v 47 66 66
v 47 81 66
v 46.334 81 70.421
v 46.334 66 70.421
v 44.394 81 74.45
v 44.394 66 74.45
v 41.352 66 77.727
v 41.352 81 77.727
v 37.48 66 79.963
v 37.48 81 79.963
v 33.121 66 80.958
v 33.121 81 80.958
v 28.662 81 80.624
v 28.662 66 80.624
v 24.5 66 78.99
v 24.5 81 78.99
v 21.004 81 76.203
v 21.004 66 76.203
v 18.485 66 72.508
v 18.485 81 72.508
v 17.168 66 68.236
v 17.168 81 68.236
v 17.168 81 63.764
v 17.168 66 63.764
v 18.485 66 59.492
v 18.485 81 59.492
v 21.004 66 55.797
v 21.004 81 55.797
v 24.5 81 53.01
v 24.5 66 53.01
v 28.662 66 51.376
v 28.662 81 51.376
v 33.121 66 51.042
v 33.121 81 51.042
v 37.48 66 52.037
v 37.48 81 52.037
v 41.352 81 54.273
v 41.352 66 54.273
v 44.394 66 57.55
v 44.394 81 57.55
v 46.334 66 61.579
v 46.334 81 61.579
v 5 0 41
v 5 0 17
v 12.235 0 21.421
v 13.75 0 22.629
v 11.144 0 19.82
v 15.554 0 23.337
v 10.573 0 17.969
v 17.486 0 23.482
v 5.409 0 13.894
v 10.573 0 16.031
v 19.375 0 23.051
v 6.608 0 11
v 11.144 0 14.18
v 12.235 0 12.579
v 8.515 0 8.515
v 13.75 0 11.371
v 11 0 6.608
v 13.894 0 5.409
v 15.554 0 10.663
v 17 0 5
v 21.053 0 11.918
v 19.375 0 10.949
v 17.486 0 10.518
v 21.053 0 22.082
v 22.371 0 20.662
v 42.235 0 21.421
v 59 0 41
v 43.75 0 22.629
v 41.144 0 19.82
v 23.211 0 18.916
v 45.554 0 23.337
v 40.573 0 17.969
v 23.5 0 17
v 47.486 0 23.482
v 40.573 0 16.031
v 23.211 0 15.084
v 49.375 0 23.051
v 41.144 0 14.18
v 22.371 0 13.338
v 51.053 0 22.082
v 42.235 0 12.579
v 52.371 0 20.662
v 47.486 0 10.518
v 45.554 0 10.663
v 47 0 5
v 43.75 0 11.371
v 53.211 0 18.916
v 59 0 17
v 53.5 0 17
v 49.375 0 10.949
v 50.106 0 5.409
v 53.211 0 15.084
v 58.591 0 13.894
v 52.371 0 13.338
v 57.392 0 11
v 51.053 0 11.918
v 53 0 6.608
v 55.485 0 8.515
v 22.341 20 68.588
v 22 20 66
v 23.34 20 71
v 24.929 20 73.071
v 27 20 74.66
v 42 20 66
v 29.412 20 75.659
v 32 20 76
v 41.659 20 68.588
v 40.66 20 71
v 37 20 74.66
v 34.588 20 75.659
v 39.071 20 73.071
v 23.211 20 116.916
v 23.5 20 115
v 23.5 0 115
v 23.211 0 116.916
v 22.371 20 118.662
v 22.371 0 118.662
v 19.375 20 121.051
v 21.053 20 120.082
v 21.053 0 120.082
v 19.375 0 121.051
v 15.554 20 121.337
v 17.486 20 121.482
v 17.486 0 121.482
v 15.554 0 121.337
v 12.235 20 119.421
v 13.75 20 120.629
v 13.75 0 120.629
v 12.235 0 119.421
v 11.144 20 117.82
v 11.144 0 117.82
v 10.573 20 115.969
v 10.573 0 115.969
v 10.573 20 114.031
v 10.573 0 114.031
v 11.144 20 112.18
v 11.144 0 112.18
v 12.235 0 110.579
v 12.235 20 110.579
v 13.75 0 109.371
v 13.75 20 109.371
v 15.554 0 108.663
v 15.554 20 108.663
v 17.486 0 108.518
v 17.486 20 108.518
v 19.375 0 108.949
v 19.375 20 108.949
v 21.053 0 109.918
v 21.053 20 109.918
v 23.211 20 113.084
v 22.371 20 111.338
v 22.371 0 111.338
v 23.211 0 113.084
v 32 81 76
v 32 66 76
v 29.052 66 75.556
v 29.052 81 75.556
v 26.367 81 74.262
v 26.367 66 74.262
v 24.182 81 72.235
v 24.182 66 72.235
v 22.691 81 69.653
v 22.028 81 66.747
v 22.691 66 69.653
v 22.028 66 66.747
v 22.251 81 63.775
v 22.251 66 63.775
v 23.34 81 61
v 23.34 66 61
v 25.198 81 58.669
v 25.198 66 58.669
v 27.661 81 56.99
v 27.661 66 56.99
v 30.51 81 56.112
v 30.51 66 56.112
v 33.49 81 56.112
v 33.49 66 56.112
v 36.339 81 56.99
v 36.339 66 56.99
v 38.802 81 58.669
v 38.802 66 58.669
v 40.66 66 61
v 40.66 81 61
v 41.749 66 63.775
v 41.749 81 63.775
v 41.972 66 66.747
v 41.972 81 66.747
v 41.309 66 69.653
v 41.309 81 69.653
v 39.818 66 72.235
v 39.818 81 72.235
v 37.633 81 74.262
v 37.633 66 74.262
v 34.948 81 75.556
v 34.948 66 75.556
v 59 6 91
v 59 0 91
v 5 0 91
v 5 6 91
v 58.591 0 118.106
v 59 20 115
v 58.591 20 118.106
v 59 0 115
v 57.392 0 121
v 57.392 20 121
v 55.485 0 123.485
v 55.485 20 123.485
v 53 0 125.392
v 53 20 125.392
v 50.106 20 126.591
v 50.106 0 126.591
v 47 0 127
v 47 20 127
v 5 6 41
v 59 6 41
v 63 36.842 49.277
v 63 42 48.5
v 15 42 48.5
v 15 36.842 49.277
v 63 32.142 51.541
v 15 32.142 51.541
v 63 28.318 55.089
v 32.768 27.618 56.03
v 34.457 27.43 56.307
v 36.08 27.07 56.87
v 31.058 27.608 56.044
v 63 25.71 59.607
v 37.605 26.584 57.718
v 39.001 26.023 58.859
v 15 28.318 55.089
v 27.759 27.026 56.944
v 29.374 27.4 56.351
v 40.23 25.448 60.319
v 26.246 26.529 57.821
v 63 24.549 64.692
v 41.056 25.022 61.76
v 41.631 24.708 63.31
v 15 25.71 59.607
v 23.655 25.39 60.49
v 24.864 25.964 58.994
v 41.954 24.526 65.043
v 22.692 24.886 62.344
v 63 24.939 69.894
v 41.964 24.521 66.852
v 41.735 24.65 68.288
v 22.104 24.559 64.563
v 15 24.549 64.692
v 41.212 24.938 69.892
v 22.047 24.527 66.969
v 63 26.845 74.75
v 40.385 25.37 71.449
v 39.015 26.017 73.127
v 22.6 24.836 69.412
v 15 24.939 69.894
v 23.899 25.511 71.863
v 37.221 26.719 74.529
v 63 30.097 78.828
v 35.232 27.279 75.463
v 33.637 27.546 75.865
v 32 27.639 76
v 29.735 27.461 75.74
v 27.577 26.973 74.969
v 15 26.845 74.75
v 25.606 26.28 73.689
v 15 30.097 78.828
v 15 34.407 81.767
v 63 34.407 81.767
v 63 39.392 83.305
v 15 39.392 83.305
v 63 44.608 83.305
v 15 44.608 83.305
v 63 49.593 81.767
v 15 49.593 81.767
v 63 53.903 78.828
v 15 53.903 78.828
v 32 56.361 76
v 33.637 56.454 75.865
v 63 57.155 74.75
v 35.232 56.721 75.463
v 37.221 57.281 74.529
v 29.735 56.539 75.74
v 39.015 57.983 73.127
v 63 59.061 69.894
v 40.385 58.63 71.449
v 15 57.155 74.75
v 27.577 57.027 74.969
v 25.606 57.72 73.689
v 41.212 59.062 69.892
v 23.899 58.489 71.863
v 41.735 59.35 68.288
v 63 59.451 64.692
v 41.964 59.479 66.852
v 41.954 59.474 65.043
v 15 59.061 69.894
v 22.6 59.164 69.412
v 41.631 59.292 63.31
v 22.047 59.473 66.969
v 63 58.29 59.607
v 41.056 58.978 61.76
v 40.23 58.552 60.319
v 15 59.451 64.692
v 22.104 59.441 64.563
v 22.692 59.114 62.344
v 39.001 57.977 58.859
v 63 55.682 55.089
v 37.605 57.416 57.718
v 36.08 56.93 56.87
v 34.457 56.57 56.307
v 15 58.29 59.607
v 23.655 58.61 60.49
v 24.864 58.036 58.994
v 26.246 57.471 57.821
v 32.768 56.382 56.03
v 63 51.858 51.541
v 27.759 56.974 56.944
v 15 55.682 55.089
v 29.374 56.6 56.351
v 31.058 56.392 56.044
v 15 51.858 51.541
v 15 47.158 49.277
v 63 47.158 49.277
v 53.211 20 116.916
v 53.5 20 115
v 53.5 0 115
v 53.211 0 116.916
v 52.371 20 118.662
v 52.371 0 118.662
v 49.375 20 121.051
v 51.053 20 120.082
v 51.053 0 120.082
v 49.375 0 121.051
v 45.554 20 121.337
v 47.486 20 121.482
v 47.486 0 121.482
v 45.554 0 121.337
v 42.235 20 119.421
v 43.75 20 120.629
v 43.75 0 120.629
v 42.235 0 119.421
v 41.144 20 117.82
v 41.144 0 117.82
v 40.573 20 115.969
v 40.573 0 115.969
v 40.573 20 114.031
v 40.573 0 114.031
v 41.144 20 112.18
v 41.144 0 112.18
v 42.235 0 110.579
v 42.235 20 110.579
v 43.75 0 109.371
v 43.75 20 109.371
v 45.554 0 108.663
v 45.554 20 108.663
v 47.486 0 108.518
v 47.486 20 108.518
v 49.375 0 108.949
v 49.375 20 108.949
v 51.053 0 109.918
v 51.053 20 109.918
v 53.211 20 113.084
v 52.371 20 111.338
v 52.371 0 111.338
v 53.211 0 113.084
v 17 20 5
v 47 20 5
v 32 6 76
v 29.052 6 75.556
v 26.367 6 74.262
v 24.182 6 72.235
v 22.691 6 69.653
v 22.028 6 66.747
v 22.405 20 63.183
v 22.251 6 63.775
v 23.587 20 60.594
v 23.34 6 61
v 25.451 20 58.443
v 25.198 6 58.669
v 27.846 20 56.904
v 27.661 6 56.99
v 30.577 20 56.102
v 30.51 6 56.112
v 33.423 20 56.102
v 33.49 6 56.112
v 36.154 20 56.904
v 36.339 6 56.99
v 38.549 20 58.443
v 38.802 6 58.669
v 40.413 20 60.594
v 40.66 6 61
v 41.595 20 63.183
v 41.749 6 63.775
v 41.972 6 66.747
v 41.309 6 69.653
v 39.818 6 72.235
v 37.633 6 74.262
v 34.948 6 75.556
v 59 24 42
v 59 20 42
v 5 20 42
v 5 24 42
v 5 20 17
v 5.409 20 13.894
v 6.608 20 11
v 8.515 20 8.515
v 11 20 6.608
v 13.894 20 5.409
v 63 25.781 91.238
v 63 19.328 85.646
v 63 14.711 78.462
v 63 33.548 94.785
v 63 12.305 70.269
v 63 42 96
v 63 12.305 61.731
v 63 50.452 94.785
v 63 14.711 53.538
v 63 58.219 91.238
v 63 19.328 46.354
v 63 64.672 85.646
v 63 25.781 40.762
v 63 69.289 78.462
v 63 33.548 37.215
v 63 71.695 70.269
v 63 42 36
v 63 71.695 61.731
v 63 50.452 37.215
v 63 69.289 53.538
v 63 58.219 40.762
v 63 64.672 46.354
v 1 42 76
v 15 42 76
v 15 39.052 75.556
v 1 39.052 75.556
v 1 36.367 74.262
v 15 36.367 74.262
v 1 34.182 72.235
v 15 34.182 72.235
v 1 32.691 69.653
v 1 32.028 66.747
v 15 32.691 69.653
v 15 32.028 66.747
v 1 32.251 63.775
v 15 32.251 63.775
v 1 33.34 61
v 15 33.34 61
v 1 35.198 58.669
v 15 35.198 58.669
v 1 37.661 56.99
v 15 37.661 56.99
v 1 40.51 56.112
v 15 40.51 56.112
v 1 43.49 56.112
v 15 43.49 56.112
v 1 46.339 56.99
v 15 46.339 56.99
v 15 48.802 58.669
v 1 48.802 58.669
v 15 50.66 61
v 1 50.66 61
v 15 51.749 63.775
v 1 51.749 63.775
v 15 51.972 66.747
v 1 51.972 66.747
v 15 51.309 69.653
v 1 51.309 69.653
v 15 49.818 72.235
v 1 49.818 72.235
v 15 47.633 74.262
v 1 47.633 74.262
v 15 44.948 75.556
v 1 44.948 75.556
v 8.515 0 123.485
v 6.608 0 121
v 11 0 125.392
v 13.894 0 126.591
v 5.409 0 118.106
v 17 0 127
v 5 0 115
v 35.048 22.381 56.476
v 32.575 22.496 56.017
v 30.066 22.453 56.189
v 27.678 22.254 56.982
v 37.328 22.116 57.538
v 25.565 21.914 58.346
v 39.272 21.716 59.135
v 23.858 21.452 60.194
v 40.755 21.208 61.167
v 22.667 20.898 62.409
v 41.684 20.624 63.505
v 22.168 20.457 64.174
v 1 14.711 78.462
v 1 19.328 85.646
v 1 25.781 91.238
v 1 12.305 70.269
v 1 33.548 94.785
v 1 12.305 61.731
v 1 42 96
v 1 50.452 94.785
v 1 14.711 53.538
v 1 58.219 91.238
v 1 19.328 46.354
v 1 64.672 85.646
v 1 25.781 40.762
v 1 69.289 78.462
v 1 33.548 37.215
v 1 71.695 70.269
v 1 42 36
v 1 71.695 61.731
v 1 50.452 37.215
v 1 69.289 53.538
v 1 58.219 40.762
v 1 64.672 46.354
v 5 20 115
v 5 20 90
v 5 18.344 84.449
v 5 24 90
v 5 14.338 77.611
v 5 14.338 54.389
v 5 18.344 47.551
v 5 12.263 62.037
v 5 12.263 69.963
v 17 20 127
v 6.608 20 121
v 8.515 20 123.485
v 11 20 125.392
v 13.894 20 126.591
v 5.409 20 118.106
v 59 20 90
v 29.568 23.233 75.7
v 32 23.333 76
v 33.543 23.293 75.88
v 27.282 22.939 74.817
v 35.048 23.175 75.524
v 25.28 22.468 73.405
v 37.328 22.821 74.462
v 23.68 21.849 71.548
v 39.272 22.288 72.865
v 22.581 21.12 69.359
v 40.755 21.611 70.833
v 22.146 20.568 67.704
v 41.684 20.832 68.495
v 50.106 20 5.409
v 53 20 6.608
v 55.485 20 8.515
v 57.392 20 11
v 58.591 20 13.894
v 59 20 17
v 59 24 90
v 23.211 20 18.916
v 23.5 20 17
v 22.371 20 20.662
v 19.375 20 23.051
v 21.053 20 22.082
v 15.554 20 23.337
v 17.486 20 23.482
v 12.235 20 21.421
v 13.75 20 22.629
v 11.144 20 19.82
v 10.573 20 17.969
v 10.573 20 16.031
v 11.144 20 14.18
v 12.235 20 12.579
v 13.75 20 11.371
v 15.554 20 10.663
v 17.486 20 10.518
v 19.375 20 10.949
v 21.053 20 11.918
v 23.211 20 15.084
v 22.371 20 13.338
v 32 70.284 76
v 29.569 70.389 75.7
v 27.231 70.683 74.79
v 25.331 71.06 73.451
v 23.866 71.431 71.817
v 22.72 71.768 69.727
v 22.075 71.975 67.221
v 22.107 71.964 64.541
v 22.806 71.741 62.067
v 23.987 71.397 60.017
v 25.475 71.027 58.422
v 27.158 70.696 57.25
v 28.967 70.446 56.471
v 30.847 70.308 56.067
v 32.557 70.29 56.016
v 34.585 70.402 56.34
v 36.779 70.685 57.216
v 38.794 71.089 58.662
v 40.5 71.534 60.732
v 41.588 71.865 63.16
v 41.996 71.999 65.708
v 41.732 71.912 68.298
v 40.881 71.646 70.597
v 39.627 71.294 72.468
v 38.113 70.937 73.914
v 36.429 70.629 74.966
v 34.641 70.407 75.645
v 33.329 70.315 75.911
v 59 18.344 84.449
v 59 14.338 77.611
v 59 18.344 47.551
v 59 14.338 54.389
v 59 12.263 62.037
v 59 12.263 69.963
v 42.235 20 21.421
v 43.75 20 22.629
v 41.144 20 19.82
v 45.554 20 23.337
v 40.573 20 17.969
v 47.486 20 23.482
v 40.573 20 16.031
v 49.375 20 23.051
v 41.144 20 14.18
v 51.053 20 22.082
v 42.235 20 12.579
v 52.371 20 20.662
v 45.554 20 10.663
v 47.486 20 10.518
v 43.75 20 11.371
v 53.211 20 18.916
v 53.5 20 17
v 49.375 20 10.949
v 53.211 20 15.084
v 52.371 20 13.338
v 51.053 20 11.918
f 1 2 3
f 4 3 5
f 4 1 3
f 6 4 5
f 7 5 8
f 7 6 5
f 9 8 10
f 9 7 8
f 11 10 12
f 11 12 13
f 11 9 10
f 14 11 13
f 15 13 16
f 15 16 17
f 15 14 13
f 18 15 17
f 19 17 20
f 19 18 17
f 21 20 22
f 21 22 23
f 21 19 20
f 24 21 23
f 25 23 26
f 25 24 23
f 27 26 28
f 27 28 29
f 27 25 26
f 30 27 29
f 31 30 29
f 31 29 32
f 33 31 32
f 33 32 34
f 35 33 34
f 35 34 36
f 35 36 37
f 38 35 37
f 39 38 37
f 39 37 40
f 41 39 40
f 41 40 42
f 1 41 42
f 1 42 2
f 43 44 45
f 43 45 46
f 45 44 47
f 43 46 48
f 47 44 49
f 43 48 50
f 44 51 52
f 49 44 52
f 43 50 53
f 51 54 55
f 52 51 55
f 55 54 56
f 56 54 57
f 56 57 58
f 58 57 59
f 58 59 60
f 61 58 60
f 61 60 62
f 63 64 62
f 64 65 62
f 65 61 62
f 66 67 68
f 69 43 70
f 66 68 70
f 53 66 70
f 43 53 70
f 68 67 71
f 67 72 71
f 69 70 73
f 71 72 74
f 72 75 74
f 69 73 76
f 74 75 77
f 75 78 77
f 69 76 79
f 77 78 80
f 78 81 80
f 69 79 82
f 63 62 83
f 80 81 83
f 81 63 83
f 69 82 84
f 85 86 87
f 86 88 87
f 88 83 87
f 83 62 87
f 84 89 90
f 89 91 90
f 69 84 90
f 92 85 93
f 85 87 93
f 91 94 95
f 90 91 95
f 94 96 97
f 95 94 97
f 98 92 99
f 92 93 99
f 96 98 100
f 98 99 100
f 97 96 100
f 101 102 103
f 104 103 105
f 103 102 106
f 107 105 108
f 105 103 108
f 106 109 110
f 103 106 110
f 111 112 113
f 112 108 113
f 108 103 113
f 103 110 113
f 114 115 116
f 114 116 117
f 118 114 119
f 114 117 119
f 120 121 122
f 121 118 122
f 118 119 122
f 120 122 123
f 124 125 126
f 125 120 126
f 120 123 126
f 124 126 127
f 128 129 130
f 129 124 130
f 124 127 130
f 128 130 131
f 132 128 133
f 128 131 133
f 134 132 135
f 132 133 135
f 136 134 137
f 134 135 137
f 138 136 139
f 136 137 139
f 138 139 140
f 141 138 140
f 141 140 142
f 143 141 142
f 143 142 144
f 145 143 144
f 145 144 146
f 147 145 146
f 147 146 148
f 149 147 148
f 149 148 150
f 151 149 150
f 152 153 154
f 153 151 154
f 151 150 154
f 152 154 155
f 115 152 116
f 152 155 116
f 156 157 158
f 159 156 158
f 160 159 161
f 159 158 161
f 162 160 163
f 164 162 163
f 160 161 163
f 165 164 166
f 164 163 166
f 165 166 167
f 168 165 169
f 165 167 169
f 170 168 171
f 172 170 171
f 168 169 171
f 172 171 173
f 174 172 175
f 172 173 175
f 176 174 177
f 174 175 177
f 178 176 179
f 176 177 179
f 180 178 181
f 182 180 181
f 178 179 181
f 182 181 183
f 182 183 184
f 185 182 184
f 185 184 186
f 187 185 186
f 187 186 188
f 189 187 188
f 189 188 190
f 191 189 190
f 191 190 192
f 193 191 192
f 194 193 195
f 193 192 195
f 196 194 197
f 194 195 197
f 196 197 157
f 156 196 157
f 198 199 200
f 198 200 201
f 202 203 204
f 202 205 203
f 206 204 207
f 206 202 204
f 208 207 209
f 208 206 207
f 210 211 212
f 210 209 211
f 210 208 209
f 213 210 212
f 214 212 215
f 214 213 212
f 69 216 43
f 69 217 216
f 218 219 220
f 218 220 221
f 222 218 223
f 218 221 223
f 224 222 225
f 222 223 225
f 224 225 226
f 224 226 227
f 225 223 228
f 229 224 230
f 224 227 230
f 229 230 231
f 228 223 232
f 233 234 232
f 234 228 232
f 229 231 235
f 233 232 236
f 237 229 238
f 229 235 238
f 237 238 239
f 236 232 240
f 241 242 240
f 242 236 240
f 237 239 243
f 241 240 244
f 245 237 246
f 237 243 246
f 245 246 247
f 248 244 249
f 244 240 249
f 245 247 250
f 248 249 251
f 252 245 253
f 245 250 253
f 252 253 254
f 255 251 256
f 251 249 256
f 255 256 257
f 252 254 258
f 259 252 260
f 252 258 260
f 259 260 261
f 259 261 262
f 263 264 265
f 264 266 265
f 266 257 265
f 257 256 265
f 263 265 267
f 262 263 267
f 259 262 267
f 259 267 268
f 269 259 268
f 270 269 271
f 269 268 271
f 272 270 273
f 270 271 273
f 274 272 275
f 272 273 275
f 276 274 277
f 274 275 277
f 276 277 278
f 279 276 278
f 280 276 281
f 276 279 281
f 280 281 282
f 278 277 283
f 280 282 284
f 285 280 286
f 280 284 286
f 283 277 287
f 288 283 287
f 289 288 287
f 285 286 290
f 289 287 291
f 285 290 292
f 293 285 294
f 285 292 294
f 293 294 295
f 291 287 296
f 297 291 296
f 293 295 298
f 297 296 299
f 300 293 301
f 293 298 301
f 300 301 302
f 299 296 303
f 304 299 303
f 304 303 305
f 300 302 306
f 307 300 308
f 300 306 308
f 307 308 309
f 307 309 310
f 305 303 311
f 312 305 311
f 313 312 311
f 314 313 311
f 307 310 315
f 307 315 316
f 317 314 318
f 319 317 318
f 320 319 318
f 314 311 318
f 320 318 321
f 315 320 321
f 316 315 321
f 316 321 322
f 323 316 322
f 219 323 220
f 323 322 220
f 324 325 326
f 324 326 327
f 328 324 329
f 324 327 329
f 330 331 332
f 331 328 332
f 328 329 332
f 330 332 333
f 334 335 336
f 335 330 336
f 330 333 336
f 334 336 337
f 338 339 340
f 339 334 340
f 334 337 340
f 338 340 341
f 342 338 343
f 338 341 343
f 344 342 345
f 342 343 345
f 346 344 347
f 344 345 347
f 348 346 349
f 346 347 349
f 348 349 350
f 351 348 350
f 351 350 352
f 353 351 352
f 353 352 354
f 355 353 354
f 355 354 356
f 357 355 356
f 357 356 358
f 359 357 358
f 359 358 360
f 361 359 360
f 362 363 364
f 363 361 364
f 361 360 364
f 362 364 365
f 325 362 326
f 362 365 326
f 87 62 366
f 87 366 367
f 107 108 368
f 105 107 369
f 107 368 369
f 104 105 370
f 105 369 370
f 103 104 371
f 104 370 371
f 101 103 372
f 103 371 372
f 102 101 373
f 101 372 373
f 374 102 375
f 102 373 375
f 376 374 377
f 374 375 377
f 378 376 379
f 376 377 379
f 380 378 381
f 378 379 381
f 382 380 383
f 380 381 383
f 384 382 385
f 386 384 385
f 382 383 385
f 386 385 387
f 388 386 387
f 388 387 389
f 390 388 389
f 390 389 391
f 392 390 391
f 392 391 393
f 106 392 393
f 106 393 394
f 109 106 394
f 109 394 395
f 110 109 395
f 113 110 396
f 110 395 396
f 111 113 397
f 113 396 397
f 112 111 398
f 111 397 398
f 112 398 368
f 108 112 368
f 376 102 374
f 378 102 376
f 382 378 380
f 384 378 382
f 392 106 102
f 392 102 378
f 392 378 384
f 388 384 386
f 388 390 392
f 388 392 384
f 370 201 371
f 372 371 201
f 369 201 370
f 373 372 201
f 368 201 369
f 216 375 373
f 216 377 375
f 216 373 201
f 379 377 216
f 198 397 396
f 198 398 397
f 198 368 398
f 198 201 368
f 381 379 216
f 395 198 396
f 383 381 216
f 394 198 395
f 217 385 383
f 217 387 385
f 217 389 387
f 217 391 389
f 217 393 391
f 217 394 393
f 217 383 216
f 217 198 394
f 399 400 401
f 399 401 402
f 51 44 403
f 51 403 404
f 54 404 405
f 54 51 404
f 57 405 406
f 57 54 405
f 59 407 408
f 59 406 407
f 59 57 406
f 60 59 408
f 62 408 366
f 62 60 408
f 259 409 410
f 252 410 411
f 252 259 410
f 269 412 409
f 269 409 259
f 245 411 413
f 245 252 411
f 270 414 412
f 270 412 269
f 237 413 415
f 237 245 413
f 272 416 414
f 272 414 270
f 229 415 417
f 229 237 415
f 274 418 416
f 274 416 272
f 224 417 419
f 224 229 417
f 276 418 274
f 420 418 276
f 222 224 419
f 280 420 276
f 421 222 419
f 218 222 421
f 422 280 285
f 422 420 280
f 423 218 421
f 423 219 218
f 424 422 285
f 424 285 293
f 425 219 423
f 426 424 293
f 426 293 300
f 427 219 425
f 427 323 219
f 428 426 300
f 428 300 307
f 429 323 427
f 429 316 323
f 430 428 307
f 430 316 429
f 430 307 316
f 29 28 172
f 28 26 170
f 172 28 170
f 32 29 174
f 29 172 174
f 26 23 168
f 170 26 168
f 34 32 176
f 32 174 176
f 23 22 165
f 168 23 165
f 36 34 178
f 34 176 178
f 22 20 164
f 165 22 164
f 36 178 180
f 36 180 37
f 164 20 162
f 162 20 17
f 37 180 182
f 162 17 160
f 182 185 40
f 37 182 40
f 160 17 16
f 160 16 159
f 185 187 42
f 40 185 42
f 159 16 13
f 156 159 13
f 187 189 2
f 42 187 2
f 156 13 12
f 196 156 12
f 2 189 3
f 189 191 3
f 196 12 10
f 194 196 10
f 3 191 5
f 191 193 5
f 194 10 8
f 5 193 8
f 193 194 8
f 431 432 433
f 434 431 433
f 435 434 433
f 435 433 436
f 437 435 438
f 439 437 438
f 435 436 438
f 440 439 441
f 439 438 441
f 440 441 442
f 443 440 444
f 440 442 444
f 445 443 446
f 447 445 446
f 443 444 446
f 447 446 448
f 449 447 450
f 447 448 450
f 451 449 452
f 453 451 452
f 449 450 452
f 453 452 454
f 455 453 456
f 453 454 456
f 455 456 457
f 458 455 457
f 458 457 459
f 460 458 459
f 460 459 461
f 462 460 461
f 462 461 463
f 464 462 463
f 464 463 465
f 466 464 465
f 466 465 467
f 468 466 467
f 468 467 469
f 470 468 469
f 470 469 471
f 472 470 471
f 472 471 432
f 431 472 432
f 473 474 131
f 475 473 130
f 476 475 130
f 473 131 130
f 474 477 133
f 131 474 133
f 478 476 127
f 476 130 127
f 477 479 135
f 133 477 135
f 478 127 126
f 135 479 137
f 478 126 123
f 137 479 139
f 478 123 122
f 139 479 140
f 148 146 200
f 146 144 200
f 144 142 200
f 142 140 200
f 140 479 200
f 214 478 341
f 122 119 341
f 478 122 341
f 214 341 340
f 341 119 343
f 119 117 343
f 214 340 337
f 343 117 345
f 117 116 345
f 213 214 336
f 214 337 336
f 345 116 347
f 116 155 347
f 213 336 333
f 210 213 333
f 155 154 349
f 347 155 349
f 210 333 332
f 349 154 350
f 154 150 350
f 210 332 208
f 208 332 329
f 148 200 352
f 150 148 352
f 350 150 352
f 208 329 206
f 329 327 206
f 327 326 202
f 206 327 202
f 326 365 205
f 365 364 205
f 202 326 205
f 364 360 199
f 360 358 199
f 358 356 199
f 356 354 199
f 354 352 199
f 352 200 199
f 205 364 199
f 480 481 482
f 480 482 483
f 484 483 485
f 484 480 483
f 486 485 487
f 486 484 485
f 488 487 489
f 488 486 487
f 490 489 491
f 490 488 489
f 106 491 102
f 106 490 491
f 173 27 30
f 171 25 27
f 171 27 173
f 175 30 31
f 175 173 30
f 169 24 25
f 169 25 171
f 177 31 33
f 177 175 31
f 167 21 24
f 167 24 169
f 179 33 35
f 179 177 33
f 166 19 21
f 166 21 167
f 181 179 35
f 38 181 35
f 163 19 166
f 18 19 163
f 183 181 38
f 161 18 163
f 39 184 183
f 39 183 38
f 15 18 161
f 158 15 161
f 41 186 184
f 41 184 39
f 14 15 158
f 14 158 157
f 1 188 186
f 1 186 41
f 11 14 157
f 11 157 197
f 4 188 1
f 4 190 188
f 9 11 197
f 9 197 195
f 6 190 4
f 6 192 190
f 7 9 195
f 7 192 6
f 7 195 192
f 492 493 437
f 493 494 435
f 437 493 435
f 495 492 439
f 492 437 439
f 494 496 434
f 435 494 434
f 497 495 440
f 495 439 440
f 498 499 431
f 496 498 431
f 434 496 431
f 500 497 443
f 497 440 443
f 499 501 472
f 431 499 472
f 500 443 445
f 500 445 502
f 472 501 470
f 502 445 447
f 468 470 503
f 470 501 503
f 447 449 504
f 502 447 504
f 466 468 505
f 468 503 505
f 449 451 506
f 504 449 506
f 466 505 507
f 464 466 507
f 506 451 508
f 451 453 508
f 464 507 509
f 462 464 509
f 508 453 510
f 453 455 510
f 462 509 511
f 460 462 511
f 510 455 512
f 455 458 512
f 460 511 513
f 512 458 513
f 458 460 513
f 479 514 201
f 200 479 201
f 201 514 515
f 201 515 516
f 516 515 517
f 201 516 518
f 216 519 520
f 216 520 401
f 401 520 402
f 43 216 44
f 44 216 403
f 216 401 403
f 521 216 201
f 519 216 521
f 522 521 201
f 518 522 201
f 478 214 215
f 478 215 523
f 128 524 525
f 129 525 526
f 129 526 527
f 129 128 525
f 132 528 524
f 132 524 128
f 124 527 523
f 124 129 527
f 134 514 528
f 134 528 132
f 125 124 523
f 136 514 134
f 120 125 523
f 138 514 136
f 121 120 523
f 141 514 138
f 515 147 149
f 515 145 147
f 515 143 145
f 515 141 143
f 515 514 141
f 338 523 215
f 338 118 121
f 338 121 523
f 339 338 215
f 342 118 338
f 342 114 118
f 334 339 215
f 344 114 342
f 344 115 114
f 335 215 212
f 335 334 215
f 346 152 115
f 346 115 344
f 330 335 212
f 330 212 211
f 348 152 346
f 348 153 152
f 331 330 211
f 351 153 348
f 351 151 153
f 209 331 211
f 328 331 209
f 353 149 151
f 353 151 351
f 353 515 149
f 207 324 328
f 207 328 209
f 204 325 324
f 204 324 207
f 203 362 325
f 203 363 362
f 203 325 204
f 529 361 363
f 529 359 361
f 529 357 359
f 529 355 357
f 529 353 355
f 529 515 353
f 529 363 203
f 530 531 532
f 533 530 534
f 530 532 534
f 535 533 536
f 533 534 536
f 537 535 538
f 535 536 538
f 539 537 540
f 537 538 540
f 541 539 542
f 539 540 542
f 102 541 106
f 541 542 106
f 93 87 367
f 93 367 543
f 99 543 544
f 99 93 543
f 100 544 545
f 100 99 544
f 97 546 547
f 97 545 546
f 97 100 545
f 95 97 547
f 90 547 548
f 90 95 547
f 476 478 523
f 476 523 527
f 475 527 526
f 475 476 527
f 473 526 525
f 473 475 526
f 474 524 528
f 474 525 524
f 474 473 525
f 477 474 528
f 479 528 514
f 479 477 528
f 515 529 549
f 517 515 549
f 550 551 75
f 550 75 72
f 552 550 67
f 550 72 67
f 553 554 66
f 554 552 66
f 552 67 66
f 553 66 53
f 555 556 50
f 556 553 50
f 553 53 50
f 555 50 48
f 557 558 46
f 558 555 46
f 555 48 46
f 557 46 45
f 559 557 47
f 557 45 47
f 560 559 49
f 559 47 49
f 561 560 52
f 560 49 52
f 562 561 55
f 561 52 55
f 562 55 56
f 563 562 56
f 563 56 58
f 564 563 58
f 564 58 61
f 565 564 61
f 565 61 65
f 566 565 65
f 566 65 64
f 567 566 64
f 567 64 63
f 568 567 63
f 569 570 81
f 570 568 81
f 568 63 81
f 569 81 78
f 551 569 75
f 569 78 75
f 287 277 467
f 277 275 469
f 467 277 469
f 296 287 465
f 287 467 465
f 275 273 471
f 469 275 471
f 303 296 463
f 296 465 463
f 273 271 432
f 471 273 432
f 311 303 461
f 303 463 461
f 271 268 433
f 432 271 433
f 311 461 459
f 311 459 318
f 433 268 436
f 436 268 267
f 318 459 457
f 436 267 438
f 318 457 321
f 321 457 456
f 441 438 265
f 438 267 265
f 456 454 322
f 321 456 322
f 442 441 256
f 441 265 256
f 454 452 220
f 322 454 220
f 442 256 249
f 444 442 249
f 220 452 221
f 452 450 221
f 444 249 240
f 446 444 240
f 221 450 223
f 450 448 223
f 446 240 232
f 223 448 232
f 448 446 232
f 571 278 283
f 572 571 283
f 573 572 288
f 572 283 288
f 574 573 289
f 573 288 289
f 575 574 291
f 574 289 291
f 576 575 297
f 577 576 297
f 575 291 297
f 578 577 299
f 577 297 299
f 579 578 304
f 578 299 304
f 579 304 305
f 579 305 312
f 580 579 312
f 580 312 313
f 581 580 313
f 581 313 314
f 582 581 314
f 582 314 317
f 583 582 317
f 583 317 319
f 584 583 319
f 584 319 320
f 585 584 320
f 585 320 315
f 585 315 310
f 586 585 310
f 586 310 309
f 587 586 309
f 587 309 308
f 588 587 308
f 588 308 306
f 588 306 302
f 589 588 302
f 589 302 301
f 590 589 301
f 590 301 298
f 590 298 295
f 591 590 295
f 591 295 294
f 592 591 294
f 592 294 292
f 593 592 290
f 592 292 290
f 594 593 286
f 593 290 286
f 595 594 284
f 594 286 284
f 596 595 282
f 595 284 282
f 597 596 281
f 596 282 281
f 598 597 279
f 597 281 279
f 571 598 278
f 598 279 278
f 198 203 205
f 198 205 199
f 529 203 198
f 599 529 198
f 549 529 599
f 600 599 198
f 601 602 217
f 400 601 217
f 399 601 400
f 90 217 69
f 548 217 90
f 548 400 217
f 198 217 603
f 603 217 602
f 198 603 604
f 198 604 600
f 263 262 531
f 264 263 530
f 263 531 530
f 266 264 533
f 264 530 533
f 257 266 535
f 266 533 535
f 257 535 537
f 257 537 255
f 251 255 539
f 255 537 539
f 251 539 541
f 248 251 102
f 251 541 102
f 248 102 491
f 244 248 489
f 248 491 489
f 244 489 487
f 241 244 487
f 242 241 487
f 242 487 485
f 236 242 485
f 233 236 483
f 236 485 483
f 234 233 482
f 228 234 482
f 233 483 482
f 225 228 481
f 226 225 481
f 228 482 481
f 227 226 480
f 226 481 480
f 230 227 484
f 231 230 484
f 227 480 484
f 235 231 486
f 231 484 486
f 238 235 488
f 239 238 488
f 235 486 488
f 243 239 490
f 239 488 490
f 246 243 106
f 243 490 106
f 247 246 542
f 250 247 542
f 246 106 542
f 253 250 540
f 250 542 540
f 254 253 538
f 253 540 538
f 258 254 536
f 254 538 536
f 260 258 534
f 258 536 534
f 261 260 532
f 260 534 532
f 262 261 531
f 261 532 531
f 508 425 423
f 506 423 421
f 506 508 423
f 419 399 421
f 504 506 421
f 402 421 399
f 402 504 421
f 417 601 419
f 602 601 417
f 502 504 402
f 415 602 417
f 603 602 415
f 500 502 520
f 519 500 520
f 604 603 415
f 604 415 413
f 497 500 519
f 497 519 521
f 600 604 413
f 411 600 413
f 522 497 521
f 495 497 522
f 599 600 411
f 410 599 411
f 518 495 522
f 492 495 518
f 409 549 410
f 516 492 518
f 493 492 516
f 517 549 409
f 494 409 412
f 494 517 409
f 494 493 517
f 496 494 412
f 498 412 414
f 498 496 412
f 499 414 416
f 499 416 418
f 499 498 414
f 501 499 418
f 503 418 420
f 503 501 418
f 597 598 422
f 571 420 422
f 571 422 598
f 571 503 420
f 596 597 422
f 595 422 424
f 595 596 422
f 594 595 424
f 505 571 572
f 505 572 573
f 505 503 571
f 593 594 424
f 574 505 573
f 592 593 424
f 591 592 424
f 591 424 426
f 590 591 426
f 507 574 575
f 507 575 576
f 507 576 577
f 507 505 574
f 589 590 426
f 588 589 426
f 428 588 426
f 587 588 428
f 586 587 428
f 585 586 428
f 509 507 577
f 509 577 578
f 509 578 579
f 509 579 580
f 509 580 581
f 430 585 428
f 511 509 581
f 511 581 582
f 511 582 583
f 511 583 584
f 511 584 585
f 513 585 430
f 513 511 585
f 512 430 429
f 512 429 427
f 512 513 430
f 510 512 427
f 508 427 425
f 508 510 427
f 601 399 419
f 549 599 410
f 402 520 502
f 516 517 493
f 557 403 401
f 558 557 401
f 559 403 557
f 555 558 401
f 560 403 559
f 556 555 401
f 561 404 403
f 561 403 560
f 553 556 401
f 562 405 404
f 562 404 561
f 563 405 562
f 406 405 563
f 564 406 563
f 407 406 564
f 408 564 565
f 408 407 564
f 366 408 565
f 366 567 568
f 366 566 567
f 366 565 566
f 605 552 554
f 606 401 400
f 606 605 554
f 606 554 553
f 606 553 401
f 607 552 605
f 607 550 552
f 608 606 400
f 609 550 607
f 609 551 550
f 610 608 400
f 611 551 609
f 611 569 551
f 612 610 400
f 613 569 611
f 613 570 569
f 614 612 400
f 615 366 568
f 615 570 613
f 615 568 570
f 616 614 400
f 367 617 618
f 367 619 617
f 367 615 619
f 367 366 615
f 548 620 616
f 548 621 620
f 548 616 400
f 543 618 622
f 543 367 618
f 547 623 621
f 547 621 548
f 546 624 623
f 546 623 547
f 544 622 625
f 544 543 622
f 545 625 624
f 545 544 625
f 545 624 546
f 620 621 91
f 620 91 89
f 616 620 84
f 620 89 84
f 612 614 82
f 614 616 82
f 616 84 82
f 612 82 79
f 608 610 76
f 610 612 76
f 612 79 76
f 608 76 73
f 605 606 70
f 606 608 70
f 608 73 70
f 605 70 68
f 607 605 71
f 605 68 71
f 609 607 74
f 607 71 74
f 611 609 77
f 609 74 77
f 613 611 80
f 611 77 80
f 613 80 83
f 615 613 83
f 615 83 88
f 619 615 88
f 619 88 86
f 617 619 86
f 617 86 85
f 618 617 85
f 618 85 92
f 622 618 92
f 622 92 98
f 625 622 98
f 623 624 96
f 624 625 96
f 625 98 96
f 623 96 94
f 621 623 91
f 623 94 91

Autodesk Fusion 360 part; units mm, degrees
sketch "Sketch1" plane through (0, 0, 0) normal (0, 1, 0) x (1, 0, 0)
  line L0 (17, -5) -> (47, -5)
  line L1 (59, -17) -> (59, -115)
  line L2 (47, -127) -> (17, -127)
  line L3 (5, -115) -> (5, -17)
  arc A0 (17, -5) -> (5, -17) centre (17, -17) ccw
  arc A1 (59, -17) -> (47, -5) centre (47, -17) ccw
  arc A2 (5, -115) -> (17, -127) centre (17, -115) ccw
  arc A3 (47, -127) -> (59, -115) centre (47, -115) ccw
  circle A4 centre (17, -115) radius 6.5
  circle A5 centre (17, -17) radius 6.5
  circle A6 centre (47, -17) radius 6.5
  circle A7 centre (47, -115) radius 6.5
  point P0 (5, -5)
  point P1 (59, -5)
  point P2 (5, -127)
  dimension "d1" = 54
  dimension "d2" = 122
  dimension "d3" = 12
  dimension "d4" = 12
  dimension "d5" = 12
  dimension "d6" = 12
  dimension "d7" = 13
  dimension "d8" = 13
  dimension "d9" = 13
  dimension "d10" = 13
extrude "Extrude1" add sketch "Sketch1" along normal blind 20 makes body 1
sketch "Sketch2" plane through (59, 0, 0) normal (1, 0, 0) x (0, 0, -1)
  line L0 (-115, 0) -> (-17, 0)
  line L1 (-17, 0) -> (-17, 20)
  line L2 (-17, 20) -> (-115, 20)
  line L3 (-115, 20) -> (-115, 0)
  line L4 (-127, 0) -> (-66, 0)
  line L5 (-66, 0) -> (-41, 0)
  line L6 (-41, 0) -> (-91, 0)
  line L7 (-91, 0) -> (-91, 6)
  line L8 (-91, 6) -> (-41, 6)
  line L9 (-41, 6) -> (-41, 0)
  dimension "d13" = 61
  dimension "d14" = 25
  dimension "d15" = 50
  dimension "d16" = 6
extrude "Extrude2" cut sketch "Sketch2" against normal blind 175 contours L0 L4 L5 L6 L7 L8 L9 bodies 1
sketch "Sketch3" plane through (0, 0, 0) normal (1, 0, 0) x (0, 0, -1)
sketch "Sketch4" plane through (59, 0, 0) normal (1, 0, 0) x (0, 0, -1)
  line L0 (-41, 6) -> (-41, 0)
  line L1 (-41, 0) -> (-17, 0)
  line L2 (-17, 0) -> (-17, 20)
  line L3 (-17, 20) -> (-115, 20)
  line L4 (-115, 20) -> (-115, 0)
  line L5 (-115, 0) -> (-91, 0)
  line L6 (-91, 0) -> (-91, 6)
  line L7 (-91, 6) -> (-41, 6)
  line L8 (-5, 20) -> (-66, 20)
  line L9 (-66, 20) -> (-66, 32)
  line L10 (-66, 32) -> (-66, 42)
  circle A0 centre (-66, 42) radius 30
  dimension "d19" = 12
  dimension "d20" = 10
  dimension "d21" = 60
extrude "Extrude3" add sketch "Sketch4" along normal blind 4 contours L3 L8 A0 | L3 L8 A0 bodies 1
extrude "Extrude4" cut sketch "Sketch4" against normal blind 55 contours L3 L8 A0 | L3 L8 A0 bodies 1
extrude "Extrude5" add 1 faces at (59, 29.7771, 73.5943) along direction (-1, 0, 0) blind 58 on bodies 1 bodies 1
hole "Hole1" at (63, 42, 66) direction (-1, 0, 0) diameter 35 depth 48 tip angle 180 bodies 1
ref_plane "WorkPlane1" through (32, 76, 66) normal (0, -1, 0) x (0, 0, 1)
sketch "Sketch5" plane through (32, 76, 66) normal (0, -1, 0) x (1, 0, 0)
  circle A0 centre (0, 0) radius 15
  dimension "d32" = 30
sketch "Sketch6" plane through (32, 76, 66) normal (0, -1, 0) x (1, 0, 0)
extrude "Extrude6" add sketch "Sketch5" against normal blind 5 separate body makes body 2
move_face "OffsetFaces1" offset 10 1 faces at (29.3337, 76, 72.5491) on bodies 2
hole "Hole2" at (32, 81, 66) direction (0, -1, 0) diameter 20 depth 100 tip angle 180 bodies 1 2
sketch "Sketch7" plane through (59, 0, 0) normal (1, 0, 0) x (0, 0, -1)
  arc A0 (-86.3961, 20) -> (-45.6039, 20) centre (-66, 42) ccw
  line L0 (-86.3961, 20) -> (-115, 20)
  line L1 (-115, 20) -> (-115, 0)
  line L2 (-115, 0) -> (-91, 0)
  line L3 (-91, 0) -> (-91, 6)
  line L4 (-91, 6) -> (-41, 6)
  line L5 (-41, 6) -> (-41, 0)
  line L6 (-41, 0) -> (-17, 0)
  line L7 (-17, 0) -> (-17, 20)
  line L8 (-17, 20) -> (-45.6039, 20)
  line L9 (-66, 42) -> (-66, 20)
  line L10 (-66, 20) -> (-90, 20)
  line L11 (-90, 20) -> (-90, 28)
  line L12 (-90, 28) -> (-66, 20)
  line L13 (-66, 20) -> (-42, 20)
  line L14 (-42, 20) -> (-42, 26)
  line L15 (-42, 26) -> (-66, 20)
  dimension "d39" = 24
  dimension "d40" = 24
extrude "Extrude8" add sketch "Sketch7" against normal blind 54 contours L8 L13 L14 L15 bodies 1
hole "Hole3" at (1, 42, 66) direction (1, 0, 0) diameter 20 depth 100 tip angle 180 bodies 1
extrude "Extrude7" add sketch "Sketch7" against normal blind 54 contours L0 L10 L11 L12 bodies 1
